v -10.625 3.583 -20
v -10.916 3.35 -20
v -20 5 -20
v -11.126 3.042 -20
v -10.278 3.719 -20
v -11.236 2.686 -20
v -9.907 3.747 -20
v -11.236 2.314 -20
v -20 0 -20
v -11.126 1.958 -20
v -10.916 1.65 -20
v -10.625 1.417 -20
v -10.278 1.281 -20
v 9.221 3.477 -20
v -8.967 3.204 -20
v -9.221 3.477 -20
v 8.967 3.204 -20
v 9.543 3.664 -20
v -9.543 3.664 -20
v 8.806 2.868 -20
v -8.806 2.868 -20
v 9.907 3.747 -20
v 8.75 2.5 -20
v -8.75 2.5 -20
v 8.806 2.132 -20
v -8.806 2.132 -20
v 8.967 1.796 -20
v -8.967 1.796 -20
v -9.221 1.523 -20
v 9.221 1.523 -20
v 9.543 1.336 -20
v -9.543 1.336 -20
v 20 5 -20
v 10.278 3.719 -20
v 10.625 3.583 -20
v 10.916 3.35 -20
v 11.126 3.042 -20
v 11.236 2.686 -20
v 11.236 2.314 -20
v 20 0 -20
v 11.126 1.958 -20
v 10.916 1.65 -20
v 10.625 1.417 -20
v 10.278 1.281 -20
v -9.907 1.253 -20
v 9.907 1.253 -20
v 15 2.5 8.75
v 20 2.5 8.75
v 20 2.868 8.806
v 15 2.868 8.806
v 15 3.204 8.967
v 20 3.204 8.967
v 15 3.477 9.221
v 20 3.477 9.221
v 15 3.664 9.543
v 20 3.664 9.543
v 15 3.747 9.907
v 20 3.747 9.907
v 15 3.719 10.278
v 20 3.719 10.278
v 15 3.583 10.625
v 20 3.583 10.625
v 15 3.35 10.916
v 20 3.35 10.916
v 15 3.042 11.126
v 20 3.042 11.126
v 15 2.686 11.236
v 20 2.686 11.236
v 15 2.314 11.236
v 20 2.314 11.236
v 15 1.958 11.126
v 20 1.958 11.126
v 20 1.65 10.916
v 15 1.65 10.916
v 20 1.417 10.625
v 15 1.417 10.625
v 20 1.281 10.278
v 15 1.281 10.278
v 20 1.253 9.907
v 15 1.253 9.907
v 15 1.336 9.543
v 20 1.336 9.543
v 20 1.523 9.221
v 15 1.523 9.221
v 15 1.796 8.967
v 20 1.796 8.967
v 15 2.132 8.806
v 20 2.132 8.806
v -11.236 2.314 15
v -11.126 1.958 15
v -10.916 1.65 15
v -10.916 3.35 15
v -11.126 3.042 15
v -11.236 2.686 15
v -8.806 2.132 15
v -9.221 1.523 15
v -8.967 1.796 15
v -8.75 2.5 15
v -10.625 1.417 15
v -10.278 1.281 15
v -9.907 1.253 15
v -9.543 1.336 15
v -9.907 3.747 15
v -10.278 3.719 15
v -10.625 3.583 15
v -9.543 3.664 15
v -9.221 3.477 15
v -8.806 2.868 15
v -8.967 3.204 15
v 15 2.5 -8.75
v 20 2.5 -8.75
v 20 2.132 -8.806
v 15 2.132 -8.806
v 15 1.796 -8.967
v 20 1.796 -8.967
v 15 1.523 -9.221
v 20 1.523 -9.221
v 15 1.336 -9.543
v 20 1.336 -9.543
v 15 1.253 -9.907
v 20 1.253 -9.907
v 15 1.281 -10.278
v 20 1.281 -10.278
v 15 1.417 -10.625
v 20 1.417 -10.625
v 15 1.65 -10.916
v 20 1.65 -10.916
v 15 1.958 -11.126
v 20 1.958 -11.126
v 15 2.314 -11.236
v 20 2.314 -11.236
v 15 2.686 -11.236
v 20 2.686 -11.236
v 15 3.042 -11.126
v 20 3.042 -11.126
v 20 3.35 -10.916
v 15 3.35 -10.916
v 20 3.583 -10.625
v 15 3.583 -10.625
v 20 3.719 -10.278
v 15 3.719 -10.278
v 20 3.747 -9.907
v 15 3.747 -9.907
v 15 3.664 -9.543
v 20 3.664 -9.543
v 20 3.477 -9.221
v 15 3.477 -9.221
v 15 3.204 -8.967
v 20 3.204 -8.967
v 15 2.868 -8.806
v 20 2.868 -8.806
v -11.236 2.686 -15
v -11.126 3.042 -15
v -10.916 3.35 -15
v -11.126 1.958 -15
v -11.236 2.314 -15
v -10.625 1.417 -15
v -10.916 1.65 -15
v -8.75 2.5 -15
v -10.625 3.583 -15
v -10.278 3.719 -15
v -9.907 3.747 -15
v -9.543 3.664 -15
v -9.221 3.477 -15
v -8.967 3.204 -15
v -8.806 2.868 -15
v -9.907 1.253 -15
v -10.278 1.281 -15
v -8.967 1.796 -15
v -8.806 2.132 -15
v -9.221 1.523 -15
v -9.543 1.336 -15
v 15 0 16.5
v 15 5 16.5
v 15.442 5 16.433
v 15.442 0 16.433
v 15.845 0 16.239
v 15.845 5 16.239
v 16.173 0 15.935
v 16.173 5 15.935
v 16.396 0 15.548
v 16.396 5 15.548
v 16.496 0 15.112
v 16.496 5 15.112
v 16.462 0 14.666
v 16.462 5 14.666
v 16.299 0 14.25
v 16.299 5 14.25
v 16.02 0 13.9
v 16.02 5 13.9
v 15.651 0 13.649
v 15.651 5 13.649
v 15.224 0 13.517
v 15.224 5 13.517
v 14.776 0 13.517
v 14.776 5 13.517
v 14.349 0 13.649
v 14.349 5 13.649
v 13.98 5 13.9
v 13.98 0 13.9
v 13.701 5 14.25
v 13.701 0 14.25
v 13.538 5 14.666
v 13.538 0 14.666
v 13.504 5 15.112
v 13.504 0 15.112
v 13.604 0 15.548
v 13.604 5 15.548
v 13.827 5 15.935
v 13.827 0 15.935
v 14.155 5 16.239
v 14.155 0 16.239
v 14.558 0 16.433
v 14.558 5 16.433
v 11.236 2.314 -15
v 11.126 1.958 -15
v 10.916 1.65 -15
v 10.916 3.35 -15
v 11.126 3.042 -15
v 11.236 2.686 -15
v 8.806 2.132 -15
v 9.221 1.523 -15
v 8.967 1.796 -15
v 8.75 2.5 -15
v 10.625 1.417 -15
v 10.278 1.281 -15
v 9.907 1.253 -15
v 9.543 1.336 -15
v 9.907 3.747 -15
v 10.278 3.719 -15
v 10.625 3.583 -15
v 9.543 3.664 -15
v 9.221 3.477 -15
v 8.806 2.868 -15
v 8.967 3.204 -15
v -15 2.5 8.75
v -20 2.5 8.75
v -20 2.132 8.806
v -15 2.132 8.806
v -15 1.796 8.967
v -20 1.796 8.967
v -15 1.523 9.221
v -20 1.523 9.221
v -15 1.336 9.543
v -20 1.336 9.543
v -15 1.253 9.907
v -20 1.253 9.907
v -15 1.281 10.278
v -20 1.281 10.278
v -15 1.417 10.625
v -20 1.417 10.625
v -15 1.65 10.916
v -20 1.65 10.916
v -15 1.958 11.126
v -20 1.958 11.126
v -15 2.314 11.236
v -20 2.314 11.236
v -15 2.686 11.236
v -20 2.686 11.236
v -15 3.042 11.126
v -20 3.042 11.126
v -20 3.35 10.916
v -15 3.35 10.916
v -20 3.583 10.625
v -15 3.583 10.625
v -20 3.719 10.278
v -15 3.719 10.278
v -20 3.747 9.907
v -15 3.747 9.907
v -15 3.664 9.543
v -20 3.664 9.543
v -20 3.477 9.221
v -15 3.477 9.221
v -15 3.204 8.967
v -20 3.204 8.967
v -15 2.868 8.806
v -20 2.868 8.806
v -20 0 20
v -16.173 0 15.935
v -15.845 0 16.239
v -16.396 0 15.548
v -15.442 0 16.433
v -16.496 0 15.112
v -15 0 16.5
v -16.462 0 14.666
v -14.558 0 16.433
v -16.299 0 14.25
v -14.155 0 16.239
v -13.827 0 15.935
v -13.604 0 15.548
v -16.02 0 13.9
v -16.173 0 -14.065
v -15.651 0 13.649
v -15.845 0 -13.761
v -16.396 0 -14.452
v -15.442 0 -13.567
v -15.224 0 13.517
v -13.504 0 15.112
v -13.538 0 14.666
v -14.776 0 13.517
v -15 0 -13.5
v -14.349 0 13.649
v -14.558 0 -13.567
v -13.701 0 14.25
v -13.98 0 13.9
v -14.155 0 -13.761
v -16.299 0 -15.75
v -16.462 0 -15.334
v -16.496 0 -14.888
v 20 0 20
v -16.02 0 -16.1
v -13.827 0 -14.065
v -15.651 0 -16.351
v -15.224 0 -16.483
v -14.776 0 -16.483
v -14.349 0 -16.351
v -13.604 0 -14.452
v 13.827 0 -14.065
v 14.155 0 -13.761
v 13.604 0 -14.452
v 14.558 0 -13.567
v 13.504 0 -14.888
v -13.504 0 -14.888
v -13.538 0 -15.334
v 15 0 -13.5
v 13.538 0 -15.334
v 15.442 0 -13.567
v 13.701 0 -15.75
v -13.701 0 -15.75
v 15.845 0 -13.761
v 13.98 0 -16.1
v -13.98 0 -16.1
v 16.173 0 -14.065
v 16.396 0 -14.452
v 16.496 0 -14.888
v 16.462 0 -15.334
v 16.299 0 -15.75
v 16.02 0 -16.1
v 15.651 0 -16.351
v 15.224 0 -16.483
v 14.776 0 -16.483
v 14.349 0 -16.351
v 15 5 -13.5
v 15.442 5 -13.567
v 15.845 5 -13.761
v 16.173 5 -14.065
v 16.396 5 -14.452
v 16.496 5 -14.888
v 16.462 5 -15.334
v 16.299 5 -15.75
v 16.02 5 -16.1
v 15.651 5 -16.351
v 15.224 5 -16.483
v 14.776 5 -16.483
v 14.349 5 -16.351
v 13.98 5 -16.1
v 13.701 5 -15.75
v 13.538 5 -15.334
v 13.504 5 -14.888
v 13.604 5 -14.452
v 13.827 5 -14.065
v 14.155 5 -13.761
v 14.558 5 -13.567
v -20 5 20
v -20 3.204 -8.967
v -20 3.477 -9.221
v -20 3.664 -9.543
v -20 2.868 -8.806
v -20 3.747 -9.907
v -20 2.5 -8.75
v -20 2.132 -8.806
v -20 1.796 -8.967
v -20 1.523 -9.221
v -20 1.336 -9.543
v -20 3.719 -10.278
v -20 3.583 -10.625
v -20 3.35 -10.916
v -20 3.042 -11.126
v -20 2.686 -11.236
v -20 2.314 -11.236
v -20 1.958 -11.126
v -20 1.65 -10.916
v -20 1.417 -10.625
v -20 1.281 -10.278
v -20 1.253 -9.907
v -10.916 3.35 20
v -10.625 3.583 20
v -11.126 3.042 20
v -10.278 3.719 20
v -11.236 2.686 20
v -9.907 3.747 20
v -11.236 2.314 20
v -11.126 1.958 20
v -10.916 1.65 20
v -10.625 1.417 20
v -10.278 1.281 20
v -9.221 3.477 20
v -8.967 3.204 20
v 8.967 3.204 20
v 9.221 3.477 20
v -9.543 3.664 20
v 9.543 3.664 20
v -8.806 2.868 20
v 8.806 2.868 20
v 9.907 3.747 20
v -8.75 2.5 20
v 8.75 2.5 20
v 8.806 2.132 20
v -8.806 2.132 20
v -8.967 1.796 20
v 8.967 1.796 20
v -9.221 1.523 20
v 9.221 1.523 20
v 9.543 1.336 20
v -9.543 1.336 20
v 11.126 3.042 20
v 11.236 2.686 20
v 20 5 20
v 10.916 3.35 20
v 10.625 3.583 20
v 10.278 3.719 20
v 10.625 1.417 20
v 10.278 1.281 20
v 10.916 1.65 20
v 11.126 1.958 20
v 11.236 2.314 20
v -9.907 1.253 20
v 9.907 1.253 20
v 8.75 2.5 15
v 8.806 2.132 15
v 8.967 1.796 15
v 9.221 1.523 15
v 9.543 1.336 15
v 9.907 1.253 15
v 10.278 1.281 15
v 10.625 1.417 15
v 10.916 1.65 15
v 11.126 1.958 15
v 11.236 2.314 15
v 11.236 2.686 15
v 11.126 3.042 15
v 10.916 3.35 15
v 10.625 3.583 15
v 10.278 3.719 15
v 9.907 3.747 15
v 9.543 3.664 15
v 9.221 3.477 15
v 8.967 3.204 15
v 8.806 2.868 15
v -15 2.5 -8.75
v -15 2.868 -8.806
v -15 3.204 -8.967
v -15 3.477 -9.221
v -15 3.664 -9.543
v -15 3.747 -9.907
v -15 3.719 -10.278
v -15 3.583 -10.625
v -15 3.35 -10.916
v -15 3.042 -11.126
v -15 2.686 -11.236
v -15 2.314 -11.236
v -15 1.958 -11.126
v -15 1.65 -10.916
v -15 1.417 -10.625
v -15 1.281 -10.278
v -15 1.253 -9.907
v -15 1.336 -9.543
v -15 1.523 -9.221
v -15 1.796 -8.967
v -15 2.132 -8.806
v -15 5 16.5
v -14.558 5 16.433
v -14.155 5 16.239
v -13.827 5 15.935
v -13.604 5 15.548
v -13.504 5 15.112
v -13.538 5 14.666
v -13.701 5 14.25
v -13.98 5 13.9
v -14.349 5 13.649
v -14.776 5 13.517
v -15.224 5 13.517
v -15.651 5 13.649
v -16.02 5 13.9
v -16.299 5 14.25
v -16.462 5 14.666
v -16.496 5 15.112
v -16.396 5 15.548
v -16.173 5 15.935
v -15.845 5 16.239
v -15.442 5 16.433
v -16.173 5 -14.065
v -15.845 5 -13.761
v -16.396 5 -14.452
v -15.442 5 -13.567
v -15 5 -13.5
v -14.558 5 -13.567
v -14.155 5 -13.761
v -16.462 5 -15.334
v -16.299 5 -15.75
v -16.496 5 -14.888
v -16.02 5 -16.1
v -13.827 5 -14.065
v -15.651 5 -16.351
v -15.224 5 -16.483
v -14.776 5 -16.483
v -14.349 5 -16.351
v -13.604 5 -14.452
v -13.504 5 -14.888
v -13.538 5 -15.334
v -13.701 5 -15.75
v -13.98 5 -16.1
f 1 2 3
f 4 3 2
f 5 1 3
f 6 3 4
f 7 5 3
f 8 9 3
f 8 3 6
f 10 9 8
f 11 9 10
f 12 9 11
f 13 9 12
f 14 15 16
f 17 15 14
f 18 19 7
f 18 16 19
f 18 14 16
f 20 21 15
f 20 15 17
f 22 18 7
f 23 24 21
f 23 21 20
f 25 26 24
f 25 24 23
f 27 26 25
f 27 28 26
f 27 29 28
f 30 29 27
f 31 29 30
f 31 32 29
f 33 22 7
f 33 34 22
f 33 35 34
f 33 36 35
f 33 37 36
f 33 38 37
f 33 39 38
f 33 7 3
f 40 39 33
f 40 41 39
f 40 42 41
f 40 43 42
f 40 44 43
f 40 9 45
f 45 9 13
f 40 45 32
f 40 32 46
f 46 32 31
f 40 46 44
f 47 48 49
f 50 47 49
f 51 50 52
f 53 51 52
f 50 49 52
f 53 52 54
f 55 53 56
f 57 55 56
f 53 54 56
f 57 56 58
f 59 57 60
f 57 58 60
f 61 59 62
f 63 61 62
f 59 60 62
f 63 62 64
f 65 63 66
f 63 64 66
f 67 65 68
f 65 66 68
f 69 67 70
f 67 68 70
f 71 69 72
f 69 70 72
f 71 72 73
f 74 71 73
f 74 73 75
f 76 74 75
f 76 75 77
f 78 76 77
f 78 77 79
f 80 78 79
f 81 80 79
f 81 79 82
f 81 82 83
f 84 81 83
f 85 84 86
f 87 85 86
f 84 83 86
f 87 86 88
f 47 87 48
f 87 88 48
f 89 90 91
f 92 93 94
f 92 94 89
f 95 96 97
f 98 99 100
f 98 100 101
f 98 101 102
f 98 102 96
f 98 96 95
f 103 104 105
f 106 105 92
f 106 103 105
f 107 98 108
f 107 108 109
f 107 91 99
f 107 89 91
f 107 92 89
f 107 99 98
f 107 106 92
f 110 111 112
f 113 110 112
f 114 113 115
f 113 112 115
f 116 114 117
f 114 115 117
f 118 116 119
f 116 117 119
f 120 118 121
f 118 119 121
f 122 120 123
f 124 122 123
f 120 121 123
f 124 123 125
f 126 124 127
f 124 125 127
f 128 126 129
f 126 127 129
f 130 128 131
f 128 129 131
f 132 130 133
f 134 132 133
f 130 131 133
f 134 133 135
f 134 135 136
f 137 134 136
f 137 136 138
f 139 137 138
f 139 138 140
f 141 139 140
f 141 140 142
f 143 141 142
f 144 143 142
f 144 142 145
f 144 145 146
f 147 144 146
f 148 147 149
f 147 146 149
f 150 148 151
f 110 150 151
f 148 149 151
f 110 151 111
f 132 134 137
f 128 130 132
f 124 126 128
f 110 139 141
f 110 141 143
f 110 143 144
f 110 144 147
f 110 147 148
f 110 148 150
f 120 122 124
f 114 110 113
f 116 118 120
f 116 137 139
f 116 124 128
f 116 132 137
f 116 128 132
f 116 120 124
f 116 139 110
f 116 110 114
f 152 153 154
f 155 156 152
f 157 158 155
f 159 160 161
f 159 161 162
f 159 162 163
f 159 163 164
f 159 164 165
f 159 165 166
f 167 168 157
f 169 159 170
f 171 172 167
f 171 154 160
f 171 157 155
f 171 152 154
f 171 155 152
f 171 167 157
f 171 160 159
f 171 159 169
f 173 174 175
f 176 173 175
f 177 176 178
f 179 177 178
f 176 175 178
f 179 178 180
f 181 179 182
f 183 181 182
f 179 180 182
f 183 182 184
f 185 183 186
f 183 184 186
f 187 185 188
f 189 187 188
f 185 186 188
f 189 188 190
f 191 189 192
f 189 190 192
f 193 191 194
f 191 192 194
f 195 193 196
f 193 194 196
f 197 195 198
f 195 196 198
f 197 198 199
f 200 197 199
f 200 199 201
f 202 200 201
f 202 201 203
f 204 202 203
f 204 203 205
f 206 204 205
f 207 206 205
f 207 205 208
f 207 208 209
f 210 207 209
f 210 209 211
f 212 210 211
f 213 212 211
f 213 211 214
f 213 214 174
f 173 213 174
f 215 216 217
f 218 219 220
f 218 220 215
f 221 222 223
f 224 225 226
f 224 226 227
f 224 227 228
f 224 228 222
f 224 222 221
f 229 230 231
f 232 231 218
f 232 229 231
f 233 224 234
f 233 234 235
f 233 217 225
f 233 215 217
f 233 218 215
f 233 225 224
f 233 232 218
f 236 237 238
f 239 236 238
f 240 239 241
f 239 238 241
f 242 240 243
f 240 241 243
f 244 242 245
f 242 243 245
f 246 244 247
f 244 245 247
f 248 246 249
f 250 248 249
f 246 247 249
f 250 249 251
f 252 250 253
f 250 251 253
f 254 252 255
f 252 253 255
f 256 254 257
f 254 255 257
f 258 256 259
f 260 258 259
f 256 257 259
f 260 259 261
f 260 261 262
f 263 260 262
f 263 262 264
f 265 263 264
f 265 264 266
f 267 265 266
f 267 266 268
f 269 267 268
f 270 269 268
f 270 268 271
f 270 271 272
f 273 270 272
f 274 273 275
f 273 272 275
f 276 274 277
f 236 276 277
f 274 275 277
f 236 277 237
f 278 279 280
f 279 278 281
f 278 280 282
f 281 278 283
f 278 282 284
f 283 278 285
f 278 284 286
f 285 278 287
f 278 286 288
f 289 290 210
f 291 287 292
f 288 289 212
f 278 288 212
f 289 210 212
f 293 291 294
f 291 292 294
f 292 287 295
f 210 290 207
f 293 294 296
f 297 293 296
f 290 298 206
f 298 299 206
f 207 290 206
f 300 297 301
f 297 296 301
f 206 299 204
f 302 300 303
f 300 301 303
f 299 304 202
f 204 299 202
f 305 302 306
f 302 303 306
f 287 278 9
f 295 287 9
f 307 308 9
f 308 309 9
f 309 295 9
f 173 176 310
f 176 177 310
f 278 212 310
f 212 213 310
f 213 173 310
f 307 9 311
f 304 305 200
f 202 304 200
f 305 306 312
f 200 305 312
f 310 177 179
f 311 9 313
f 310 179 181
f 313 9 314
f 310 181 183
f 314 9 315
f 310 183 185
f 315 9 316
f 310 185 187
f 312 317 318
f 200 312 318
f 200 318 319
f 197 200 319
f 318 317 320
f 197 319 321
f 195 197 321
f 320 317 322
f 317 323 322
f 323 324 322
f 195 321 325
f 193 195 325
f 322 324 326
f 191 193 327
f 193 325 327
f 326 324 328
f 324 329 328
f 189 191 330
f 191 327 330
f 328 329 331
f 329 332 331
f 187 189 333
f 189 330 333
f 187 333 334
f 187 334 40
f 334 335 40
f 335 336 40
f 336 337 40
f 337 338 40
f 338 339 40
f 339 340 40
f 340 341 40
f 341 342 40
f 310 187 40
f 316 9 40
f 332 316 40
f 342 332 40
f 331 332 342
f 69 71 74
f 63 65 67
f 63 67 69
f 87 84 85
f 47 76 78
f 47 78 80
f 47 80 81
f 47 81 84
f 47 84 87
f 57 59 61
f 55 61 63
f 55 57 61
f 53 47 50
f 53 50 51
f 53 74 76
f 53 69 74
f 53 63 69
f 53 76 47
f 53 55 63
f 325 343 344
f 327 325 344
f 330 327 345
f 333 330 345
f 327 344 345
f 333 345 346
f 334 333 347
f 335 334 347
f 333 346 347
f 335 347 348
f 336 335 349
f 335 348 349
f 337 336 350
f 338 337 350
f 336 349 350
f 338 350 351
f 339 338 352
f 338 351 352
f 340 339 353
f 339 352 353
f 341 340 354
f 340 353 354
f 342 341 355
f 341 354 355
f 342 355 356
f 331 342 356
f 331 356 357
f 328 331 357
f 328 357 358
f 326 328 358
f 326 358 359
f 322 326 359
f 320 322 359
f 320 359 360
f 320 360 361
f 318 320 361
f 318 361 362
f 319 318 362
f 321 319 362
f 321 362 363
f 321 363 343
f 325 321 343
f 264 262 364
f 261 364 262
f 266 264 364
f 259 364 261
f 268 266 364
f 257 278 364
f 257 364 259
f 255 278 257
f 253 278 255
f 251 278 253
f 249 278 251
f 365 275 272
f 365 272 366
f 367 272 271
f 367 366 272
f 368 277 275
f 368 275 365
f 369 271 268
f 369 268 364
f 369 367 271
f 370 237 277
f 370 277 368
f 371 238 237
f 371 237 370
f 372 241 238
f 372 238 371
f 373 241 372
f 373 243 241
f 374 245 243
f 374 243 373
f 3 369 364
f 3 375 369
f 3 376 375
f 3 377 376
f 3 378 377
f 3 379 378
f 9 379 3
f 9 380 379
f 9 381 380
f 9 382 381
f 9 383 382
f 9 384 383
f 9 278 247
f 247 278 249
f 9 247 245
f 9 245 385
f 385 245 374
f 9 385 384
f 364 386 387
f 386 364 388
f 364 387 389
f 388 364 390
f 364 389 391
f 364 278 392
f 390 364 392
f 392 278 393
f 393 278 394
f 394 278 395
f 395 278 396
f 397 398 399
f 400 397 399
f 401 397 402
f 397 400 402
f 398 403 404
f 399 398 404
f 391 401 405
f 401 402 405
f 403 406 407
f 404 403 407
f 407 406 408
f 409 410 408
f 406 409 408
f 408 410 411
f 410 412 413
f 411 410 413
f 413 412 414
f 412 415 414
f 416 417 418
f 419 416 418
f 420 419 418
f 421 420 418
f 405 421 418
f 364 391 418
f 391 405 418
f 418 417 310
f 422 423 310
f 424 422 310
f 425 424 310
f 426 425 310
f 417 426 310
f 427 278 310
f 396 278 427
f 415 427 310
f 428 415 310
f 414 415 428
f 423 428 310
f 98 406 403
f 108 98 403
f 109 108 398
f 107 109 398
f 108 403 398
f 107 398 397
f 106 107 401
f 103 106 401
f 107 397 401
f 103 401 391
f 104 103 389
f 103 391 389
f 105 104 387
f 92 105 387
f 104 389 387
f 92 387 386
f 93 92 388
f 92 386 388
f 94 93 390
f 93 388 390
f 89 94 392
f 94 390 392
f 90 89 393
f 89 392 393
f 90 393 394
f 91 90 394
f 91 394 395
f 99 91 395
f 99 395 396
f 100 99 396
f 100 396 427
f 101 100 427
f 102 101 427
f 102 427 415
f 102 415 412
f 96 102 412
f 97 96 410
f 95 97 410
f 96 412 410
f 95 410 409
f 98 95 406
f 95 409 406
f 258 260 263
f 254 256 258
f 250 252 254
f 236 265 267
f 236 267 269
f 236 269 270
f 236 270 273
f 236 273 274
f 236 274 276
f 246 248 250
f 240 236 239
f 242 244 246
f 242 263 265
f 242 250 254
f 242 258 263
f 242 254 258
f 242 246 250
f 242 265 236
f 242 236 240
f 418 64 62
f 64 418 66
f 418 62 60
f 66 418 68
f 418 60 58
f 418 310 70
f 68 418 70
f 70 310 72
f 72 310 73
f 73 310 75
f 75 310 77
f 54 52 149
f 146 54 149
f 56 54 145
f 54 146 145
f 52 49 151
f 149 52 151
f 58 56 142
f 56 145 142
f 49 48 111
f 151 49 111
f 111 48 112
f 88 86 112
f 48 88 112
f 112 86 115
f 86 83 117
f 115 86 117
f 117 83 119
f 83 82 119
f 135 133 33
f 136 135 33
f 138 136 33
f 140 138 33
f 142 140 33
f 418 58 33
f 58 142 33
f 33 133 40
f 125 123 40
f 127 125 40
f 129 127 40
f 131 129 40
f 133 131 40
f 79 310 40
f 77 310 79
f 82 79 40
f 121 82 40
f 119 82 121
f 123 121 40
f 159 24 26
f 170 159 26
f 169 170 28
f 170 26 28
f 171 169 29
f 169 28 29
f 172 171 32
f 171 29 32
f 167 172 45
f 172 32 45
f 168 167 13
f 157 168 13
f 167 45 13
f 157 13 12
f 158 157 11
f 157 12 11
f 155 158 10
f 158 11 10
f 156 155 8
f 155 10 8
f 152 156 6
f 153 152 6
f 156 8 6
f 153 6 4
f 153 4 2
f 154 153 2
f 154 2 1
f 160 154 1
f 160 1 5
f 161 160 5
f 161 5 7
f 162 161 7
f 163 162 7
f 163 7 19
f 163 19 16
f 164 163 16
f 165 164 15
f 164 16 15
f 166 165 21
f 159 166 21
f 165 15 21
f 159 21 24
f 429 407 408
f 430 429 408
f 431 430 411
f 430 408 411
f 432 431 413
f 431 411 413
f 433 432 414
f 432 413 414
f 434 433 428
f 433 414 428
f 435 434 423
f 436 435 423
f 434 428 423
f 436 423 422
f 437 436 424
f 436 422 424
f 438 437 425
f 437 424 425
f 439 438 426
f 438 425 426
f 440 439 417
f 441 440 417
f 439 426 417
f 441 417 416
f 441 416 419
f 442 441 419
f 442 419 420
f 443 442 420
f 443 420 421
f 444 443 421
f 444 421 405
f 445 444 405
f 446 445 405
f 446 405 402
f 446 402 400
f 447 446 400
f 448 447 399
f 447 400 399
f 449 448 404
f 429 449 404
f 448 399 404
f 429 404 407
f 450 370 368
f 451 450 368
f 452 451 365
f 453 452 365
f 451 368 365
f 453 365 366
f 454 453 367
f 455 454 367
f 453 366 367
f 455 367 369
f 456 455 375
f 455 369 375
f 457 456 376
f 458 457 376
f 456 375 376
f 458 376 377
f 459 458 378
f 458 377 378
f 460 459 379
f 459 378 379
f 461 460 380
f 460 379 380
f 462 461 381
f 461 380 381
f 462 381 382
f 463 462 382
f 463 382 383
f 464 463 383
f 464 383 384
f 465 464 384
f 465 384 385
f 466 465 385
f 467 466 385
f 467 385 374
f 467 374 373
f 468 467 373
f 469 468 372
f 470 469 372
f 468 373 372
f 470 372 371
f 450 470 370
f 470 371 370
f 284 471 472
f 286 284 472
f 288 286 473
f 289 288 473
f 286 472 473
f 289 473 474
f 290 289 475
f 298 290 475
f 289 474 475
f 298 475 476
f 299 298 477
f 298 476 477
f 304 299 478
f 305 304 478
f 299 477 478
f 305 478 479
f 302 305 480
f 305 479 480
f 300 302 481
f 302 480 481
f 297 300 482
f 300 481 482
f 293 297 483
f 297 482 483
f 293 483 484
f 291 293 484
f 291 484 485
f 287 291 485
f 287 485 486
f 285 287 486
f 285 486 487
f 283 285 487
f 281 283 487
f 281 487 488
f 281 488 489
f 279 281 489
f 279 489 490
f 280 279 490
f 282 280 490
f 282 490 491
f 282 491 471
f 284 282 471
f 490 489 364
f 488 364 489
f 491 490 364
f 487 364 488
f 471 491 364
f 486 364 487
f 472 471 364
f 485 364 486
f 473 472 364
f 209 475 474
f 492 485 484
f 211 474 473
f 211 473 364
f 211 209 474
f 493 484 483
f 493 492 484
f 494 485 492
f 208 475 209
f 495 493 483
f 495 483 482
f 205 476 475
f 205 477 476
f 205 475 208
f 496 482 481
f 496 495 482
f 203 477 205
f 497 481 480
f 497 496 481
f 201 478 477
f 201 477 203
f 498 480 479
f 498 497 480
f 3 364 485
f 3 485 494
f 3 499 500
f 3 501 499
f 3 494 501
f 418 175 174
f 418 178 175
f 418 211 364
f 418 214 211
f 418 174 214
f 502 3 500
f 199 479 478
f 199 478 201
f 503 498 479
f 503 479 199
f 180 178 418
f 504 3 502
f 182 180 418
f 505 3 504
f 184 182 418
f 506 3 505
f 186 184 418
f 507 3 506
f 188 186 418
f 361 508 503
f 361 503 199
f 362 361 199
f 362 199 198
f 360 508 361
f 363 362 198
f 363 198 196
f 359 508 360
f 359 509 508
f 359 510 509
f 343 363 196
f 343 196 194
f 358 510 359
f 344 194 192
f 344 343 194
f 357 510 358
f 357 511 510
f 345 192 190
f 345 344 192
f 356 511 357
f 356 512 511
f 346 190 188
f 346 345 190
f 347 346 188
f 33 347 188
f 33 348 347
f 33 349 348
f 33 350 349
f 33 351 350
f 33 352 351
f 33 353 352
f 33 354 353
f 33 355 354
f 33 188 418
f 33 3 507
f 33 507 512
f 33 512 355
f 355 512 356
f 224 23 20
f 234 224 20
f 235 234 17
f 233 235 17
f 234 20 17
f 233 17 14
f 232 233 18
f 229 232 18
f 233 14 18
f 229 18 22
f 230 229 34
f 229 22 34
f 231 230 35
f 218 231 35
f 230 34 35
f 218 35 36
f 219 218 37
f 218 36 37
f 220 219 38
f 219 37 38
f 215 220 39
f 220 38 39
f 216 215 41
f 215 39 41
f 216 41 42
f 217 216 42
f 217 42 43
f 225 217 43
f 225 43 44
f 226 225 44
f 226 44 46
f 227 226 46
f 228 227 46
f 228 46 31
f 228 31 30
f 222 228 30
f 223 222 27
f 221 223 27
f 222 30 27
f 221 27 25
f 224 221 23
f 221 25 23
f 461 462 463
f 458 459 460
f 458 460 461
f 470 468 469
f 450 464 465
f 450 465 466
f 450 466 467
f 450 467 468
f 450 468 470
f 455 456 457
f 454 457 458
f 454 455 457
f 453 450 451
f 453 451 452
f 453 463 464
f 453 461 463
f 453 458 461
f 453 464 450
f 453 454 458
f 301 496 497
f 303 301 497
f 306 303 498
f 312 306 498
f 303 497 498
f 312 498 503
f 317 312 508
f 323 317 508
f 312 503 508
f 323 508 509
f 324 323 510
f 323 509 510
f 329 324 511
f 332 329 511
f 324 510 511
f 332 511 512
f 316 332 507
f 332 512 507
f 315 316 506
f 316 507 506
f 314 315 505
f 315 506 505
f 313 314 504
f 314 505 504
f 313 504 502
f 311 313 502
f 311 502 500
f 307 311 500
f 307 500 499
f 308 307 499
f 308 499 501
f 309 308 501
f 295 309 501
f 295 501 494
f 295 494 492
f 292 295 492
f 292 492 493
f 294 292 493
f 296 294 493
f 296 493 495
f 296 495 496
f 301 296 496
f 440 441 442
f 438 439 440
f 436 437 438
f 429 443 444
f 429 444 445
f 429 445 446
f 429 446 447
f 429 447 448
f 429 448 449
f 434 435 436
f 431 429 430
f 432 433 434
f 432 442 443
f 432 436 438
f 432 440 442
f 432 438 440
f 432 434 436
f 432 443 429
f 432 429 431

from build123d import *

# Parameters (mm, degrees)
SKETCH1_W           = 40
SKETCH1_H           = 40
BOSS_EXTRUDE1_DEPTH = 5
SKETCH2_R           = 1.25
CUT_EXTRUDE1_DEPTH  = 5
CIRPATTERN1_COUNT   = 4
SKETCH3_R           = 1.5
CUT_EXTRUDE3_DEPTH  = 10


with BuildPart() as part:
    # Sketch1 → Boss-Extrude1 (new body)
    with BuildSketch(Plane(origin=(0, 0, 0), x_dir=(1, 0, 0), z_dir=(0, 1, 0))):
        Rectangle(SKETCH1_W, SKETCH1_H)
    extrude(amount=BOSS_EXTRUDE1_DEPTH)

    # Sketch2 → Cut-Extrude1 (cut)
    with BuildSketch(Plane.XY.offset(20)):
        with Locations((-10, 2.5)):
            Circle(SKETCH2_R)
        with Locations(Location((10, 2.5, 0), (0, 0, 180))):
            Circle(SKETCH2_R)
    cut_extrude1 = extrude(amount=-CUT_EXTRUDE1_DEPTH, mode=Mode.SUBTRACT)

    # CirPattern1: Cut-Extrude1 ×4 about axis
    cirpattern1_axis = Axis((0, 0, 0), (0, 1, 0))
    for i in range(1, CIRPATTERN1_COUNT):
        add(cut_extrude1.rotate(cirpattern1_axis, i * 360 / CIRPATTERN1_COUNT), mode=Mode.SUBTRACT)

    # Sketch3 → Cut-Extrude3 (cut)
    with BuildSketch(Plane(origin=(0, 5, 0), x_dir=(1, 0, 0), z_dir=(0, 1, 0))):
        with Locations(Location((-15, 15, 0), (0, 0, 270))):
            Circle(SKETCH3_R)
        with Locations(Location((15, 15, 0), (0, 0, 270))):
            Circle(SKETCH3_R)
        with Locations(Location((15, -15, 0), (0, 0, 270))):
            Circle(SKETCH3_R)
        with Locations(Location((-15, -15, 0), (0, 0, 270))):
            Circle(SKETCH3_R)
    extrude(amount=-CUT_EXTRUDE3_DEPTH, mode=Mode.SUBTRACT)


solid = part.part
